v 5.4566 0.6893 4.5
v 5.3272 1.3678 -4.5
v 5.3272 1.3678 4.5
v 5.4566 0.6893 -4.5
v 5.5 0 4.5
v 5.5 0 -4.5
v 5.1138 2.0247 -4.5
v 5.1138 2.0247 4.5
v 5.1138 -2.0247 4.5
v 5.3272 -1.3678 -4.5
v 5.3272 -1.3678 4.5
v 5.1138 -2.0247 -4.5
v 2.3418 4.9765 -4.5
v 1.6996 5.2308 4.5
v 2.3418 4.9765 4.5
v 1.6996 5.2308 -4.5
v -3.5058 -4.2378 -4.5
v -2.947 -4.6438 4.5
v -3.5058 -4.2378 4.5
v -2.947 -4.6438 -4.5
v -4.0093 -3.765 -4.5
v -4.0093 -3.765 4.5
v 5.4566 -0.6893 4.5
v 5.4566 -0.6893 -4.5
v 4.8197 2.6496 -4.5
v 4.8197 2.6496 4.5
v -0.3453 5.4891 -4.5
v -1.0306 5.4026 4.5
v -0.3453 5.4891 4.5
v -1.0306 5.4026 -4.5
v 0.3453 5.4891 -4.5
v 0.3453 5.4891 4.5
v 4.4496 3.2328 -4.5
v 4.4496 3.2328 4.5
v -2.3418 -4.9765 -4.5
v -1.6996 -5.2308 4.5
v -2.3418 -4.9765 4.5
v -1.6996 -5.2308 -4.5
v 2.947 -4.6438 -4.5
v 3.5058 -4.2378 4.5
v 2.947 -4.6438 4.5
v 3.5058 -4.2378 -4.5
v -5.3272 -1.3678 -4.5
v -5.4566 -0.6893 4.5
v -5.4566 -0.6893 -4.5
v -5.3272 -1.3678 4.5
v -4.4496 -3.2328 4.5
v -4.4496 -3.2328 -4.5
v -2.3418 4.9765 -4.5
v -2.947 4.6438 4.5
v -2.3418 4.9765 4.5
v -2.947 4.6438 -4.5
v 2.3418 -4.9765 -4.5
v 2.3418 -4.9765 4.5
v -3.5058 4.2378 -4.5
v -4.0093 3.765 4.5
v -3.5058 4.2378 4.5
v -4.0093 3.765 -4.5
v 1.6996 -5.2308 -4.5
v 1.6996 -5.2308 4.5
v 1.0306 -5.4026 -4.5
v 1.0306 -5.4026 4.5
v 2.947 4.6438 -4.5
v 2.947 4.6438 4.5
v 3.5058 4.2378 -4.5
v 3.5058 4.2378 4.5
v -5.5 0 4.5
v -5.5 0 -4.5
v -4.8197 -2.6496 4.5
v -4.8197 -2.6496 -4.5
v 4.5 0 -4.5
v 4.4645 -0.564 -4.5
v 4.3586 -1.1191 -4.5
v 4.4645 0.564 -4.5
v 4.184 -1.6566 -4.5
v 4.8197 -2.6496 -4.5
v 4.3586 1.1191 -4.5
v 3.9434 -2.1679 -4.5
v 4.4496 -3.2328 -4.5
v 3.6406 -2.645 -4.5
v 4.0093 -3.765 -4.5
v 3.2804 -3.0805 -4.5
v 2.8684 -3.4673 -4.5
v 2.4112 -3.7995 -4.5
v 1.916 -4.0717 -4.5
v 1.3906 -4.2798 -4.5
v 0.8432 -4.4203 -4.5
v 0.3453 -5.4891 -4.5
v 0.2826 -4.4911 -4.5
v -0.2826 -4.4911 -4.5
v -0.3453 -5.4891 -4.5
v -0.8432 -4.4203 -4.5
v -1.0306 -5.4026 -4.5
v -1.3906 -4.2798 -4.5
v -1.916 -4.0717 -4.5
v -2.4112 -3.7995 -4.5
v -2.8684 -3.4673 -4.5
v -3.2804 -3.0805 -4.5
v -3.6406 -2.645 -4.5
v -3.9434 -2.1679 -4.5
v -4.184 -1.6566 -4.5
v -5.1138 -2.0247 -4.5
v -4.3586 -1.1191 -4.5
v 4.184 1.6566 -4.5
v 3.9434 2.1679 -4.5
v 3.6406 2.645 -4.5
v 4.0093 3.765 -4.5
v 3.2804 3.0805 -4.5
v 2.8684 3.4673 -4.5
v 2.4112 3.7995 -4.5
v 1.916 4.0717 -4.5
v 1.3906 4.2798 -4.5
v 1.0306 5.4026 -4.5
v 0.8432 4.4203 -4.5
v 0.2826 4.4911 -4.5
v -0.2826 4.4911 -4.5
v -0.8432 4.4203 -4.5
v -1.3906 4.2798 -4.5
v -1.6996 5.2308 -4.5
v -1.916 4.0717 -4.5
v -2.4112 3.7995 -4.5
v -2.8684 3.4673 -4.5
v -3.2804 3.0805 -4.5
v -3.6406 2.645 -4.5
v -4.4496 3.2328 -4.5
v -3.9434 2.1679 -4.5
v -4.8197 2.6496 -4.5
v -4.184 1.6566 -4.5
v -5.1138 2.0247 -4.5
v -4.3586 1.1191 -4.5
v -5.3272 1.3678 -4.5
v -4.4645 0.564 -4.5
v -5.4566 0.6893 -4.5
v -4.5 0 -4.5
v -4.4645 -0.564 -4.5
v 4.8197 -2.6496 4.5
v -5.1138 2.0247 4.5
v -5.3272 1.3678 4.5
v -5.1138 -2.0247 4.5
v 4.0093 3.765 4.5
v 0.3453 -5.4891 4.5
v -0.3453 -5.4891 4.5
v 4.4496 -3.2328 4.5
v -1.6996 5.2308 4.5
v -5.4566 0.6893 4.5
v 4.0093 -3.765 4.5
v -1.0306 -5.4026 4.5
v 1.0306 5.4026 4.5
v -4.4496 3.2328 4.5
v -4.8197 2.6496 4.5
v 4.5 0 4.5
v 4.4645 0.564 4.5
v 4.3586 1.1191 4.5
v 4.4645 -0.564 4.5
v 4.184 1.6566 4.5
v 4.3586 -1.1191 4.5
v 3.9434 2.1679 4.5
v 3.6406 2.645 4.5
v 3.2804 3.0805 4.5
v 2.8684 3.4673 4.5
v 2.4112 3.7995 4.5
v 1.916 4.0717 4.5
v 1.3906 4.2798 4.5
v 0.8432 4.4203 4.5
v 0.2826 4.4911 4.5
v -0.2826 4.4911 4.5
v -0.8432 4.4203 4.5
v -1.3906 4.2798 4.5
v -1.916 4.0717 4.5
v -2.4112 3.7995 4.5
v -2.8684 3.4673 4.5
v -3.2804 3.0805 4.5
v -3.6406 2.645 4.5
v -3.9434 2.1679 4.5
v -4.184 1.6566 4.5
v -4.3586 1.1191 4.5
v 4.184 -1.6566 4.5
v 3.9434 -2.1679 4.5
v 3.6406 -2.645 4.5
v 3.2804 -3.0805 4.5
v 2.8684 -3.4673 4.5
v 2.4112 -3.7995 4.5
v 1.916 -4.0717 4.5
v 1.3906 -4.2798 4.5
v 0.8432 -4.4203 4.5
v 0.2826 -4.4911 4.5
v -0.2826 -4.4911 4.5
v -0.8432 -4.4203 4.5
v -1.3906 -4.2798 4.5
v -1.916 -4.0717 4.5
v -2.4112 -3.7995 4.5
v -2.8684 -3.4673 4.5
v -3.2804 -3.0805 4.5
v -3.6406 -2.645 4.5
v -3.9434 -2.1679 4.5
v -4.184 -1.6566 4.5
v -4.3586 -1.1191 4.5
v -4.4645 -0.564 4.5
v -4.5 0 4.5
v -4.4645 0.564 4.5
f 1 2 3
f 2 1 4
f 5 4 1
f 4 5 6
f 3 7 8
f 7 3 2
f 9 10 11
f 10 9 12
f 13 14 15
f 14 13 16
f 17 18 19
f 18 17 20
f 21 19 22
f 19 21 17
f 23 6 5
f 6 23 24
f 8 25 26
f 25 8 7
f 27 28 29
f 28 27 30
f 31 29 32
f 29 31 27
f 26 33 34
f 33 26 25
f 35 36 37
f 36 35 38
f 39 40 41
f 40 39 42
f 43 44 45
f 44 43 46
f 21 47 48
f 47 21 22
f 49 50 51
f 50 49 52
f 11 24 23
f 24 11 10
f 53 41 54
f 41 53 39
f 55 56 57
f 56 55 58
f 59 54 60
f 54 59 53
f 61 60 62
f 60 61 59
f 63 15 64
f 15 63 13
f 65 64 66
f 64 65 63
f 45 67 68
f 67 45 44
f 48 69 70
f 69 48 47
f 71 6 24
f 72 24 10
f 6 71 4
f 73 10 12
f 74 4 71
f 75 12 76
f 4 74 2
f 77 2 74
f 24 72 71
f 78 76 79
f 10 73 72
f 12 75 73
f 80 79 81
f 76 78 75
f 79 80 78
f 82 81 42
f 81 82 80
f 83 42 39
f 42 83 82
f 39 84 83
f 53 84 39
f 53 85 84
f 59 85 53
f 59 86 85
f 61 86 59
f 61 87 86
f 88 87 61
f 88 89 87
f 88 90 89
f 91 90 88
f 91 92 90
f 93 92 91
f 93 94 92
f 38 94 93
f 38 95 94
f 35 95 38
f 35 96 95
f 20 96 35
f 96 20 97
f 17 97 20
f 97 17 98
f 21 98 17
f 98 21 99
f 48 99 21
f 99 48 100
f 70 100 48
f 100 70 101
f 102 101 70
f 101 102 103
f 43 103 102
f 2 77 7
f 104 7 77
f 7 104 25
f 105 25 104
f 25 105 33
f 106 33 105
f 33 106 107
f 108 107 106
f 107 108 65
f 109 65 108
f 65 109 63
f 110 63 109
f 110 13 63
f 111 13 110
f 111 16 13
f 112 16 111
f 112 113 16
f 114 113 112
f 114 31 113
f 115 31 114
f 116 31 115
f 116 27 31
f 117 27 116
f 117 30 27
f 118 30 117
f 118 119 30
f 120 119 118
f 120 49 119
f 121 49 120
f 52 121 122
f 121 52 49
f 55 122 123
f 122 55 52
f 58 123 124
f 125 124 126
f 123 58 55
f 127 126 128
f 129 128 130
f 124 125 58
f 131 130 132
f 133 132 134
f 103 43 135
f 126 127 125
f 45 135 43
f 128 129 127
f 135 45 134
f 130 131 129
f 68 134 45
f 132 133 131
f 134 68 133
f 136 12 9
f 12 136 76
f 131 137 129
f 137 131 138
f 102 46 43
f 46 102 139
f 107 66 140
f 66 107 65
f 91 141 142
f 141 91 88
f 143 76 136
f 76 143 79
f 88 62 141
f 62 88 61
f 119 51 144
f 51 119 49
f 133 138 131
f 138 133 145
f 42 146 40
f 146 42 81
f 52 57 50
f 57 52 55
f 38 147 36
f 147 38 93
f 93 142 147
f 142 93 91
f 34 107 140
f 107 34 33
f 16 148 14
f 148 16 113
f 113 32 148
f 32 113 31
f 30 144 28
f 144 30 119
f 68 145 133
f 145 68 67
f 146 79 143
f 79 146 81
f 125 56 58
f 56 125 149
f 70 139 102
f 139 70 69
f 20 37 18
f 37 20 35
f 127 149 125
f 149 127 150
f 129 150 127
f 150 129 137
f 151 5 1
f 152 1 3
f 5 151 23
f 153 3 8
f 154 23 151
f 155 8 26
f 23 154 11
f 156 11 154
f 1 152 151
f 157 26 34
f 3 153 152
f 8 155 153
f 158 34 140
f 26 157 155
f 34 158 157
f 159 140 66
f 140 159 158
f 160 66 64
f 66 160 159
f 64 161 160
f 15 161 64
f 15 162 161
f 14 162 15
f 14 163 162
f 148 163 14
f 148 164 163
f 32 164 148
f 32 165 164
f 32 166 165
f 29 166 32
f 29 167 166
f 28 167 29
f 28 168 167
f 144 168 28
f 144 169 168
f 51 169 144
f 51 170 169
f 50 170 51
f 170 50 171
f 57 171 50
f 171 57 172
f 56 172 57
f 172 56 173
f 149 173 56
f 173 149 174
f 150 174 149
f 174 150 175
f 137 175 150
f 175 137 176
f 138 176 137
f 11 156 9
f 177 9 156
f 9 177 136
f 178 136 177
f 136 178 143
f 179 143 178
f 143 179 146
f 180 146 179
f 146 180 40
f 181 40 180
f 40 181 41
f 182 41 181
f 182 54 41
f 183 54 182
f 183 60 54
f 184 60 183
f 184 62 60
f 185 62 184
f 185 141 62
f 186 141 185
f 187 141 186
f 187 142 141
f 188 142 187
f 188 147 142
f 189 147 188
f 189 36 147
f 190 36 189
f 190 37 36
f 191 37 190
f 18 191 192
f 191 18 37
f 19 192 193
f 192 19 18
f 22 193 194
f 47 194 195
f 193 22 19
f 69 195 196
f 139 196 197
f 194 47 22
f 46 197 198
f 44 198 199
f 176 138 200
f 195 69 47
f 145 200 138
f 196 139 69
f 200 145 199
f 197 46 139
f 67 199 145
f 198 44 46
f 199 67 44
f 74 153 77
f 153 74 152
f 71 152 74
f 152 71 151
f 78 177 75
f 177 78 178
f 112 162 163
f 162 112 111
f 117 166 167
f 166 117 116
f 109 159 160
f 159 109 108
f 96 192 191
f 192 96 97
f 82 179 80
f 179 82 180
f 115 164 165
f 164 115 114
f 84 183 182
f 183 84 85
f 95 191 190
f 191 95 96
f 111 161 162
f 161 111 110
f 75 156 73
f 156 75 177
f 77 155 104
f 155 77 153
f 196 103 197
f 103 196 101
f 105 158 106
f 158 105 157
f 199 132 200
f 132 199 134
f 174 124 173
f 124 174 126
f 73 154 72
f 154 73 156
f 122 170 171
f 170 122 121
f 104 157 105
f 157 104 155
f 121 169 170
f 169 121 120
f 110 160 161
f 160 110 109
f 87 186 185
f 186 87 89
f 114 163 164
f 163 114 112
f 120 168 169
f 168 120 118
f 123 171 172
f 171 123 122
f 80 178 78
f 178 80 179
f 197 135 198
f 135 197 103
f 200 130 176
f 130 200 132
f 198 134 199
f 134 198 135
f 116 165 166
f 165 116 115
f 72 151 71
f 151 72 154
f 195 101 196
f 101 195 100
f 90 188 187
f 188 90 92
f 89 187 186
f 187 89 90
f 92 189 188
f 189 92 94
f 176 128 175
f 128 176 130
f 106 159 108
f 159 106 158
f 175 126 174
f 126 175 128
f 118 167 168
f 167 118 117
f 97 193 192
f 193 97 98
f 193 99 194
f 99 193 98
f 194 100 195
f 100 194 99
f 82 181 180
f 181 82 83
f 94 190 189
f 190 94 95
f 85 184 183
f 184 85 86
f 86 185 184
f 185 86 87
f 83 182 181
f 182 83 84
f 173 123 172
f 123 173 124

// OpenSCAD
$fn = 50;


difference() {
	union() {
		translate(v = [0, 0, -4.5000000000]) {
			cylinder(h = 9, r = 5.5000000000);
		}
	}
	union() {
		translate(v = [0, 0, -100.0000000000]) {
			cylinder(h = 200, r = 4.5000000000);
		}
	}
}
